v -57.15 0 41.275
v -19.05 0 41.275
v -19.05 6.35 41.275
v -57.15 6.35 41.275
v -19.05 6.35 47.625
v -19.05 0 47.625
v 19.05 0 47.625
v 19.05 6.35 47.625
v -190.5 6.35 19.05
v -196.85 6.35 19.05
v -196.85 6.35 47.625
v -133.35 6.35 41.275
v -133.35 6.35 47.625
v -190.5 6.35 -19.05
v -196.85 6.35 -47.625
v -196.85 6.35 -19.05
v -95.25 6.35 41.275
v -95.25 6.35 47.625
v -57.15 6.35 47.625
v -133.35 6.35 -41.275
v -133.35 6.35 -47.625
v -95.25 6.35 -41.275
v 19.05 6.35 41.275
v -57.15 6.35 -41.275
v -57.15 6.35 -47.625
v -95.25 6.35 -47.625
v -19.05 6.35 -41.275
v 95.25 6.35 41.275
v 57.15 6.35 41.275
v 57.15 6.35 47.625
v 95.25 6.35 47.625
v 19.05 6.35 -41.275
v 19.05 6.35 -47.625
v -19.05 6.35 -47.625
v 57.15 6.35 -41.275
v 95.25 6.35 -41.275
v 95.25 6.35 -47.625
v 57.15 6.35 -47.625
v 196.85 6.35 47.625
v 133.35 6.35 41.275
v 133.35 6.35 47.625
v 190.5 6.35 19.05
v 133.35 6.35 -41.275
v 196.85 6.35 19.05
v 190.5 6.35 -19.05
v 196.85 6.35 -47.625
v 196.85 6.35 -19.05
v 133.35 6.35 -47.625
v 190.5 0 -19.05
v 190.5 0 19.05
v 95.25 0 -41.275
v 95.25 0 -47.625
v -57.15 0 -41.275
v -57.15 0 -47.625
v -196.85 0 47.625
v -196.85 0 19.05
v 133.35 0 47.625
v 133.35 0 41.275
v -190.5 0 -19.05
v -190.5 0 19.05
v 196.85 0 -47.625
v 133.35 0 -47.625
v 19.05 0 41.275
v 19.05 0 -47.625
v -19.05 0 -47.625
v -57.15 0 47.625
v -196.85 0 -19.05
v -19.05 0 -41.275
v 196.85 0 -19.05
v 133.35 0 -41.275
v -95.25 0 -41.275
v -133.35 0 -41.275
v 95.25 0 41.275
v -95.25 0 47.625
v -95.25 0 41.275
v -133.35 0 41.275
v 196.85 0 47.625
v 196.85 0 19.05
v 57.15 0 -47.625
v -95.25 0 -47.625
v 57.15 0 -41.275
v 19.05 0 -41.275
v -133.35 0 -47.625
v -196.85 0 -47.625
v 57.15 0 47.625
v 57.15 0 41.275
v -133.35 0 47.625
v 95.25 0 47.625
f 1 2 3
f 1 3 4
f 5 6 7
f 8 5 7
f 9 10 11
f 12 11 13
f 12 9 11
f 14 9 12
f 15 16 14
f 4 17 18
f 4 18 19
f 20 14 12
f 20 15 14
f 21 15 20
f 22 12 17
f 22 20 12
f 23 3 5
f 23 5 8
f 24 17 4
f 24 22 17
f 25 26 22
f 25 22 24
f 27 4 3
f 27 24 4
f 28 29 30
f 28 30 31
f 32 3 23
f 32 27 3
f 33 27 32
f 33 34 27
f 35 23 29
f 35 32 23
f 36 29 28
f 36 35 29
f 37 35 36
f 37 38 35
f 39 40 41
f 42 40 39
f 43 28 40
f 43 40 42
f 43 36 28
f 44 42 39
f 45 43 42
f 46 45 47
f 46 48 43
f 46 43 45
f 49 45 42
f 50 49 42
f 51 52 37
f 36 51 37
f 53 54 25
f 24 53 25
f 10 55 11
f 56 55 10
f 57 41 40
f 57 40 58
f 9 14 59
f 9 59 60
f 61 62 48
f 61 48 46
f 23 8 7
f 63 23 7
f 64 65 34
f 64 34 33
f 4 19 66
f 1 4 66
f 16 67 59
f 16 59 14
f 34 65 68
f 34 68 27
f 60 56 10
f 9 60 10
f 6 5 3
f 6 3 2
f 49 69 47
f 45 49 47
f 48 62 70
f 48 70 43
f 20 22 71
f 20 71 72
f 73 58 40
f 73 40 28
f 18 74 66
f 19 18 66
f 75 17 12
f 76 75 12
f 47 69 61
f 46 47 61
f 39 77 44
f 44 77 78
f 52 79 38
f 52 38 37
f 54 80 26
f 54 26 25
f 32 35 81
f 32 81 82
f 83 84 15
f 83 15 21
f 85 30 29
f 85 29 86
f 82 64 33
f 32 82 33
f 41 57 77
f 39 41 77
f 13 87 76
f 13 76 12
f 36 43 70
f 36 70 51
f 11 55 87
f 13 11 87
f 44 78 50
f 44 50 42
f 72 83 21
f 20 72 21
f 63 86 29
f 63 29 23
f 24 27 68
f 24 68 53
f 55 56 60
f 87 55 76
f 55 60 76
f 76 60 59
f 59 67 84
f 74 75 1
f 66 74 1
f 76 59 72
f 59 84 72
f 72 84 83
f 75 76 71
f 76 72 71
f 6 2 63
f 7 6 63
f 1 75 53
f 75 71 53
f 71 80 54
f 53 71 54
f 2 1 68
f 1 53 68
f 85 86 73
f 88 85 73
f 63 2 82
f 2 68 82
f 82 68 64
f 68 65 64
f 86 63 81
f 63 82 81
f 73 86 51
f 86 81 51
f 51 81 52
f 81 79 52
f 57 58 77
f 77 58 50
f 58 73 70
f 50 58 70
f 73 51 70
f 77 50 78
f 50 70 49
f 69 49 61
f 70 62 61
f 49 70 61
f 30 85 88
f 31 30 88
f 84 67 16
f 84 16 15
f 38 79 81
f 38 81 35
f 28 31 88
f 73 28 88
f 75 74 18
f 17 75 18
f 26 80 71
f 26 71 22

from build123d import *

# Parameters (mm, degrees)
ESQUISSE1_W                = 393.7
ESQUISSE1_H                = 95.25
BOSS_EXTRU_1_DEPTH         = 6.35
ESQUISSE2_W                = 38.1
ESQUISSE2_H                = 6.35
ENL_V_MAT_EXTRU_1_DEPTH    = 6.35
ESQUISSE3_W                = 38.1
ESQUISSE3_H                = 6.35
ENL_V_MAT_EXTRU_2_DEPTH    = 6.35
R_P_TITION_LIN_AIRE1_COUNT = 4
R_P_TITION_LIN_AIRE1_PITCH = 76.2
SYM_TRIE2_COPY_1_SKETCH_W  = 38.1
SYM_TRIE2_COPY_1_SKETCH_H  = 6.35
SYM_TRIE2_COPY_1_DEPTH     = 6.35
SYM_TRIE2_COPY_2_SKETCH_W  = 38.1
SYM_TRIE2_COPY_2_SKETCH_H  = 6.35
SYM_TRIE2_COPY_2_DEPTH     = 6.35
SYM_TRIE2_COPY_3_SKETCH_W  = 38.1
SYM_TRIE2_COPY_3_SKETCH_H  = 6.35
SYM_TRIE2_COPY_3_DEPTH     = 6.35


with BuildPart() as part:
    # Esquisse1 → Boss.-Extru.1 (new body)
    with BuildSketch(Plane(origin=(0, 0, 0), x_dir=(1, 0, 0), z_dir=(0, 1, 0))):
        Rectangle(ESQUISSE1_W, ESQUISSE1_H)
    extrude(amount=BOSS_EXTRU_1_DEPTH)

    # Esquisse2 → Enlèv. mat.-Extru.1 (cut)
    with BuildSketch(Plane.ZY.offset(196.85)):
        with Locations((0, 3.175)):
            Rectangle(ESQUISSE2_W, ESQUISSE2_H)
    enl_v_mat_extru_1 = extrude(amount=-ENL_V_MAT_EXTRU_1_DEPTH, mode=Mode.SUBTRACT)

    # Symétrie1: Enlèv. mat.-Extru.1 across plane
    add(enl_v_mat_extru_1.mirror(Plane(origin=(0, 0, 0), x_dir=(0, 0, 1), z_dir=(1, 0, 0))), mode=Mode.SUBTRACT)

    # Esquisse3 → Enlèv. mat.-Extru.2 (cut)
    with BuildSketch(Plane(origin=(0, 0, -47.625), x_dir=(-1, 0, 0), z_dir=(0, 0, -1))):
        with Locations((114.3, 3.175)):
            Rectangle(ESQUISSE3_W, ESQUISSE3_H)
    enl_v_mat_extru_2 = extrude(amount=-ENL_V_MAT_EXTRU_2_DEPTH, mode=Mode.SUBTRACT)

    # Répétition linéaire1: Enlèv. mat.-Extru.2 ×4
    with Locations(*[(i * R_P_TITION_LIN_AIRE1_PITCH, 0, 0) for i in range(1, R_P_TITION_LIN_AIRE1_COUNT)]):
        add(enl_v_mat_extru_2, mode=Mode.SUBTRACT)

    # Symétrie2: Enlèv. mat.-Extru.2 across plane
    add(enl_v_mat_extru_2.mirror(Plane.XY), mode=Mode.SUBTRACT)

    # Symétrie2 copy 1 sketch → Symétrie2 copy 1 (cut)
    with BuildSketch(Plane(origin=(76.2, 0, 47.625), x_dir=(-1, 0, 0), z_dir=(0, 0, 1))):
        with Locations((114.3, -3.175)):
            Rectangle(SYM_TRIE2_COPY_1_SKETCH_W, SYM_TRIE2_COPY_1_SKETCH_H)
    extrude(amount=-SYM_TRIE2_COPY_1_DEPTH, mode=Mode.SUBTRACT)

    # Symétrie2 copy 2 sketch → Symétrie2 copy 2 (cut)
    with BuildSketch(Plane(origin=(152.4, 0, 47.625), x_dir=(-1, 0, 0), z_dir=(0, 0, 1))):
        with Locations((114.3, -3.175)):
            Rectangle(SYM_TRIE2_COPY_2_SKETCH_W, SYM_TRIE2_COPY_2_SKETCH_H)
    extrude(amount=-SYM_TRIE2_COPY_2_DEPTH, mode=Mode.SUBTRACT)

    # Symétrie2 copy 3 sketch → Symétrie2 copy 3 (cut)
    with BuildSketch(Plane(origin=(228.6, 0, 47.625), x_dir=(-1, 0, 0), z_dir=(0, 0, 1))):
        with Locations((114.3, -3.175)):
            Rectangle(SYM_TRIE2_COPY_3_SKETCH_W, SYM_TRIE2_COPY_3_SKETCH_H)
    extrude(amount=-SYM_TRIE2_COPY_3_DEPTH, mode=Mode.SUBTRACT)


solid = part.part
